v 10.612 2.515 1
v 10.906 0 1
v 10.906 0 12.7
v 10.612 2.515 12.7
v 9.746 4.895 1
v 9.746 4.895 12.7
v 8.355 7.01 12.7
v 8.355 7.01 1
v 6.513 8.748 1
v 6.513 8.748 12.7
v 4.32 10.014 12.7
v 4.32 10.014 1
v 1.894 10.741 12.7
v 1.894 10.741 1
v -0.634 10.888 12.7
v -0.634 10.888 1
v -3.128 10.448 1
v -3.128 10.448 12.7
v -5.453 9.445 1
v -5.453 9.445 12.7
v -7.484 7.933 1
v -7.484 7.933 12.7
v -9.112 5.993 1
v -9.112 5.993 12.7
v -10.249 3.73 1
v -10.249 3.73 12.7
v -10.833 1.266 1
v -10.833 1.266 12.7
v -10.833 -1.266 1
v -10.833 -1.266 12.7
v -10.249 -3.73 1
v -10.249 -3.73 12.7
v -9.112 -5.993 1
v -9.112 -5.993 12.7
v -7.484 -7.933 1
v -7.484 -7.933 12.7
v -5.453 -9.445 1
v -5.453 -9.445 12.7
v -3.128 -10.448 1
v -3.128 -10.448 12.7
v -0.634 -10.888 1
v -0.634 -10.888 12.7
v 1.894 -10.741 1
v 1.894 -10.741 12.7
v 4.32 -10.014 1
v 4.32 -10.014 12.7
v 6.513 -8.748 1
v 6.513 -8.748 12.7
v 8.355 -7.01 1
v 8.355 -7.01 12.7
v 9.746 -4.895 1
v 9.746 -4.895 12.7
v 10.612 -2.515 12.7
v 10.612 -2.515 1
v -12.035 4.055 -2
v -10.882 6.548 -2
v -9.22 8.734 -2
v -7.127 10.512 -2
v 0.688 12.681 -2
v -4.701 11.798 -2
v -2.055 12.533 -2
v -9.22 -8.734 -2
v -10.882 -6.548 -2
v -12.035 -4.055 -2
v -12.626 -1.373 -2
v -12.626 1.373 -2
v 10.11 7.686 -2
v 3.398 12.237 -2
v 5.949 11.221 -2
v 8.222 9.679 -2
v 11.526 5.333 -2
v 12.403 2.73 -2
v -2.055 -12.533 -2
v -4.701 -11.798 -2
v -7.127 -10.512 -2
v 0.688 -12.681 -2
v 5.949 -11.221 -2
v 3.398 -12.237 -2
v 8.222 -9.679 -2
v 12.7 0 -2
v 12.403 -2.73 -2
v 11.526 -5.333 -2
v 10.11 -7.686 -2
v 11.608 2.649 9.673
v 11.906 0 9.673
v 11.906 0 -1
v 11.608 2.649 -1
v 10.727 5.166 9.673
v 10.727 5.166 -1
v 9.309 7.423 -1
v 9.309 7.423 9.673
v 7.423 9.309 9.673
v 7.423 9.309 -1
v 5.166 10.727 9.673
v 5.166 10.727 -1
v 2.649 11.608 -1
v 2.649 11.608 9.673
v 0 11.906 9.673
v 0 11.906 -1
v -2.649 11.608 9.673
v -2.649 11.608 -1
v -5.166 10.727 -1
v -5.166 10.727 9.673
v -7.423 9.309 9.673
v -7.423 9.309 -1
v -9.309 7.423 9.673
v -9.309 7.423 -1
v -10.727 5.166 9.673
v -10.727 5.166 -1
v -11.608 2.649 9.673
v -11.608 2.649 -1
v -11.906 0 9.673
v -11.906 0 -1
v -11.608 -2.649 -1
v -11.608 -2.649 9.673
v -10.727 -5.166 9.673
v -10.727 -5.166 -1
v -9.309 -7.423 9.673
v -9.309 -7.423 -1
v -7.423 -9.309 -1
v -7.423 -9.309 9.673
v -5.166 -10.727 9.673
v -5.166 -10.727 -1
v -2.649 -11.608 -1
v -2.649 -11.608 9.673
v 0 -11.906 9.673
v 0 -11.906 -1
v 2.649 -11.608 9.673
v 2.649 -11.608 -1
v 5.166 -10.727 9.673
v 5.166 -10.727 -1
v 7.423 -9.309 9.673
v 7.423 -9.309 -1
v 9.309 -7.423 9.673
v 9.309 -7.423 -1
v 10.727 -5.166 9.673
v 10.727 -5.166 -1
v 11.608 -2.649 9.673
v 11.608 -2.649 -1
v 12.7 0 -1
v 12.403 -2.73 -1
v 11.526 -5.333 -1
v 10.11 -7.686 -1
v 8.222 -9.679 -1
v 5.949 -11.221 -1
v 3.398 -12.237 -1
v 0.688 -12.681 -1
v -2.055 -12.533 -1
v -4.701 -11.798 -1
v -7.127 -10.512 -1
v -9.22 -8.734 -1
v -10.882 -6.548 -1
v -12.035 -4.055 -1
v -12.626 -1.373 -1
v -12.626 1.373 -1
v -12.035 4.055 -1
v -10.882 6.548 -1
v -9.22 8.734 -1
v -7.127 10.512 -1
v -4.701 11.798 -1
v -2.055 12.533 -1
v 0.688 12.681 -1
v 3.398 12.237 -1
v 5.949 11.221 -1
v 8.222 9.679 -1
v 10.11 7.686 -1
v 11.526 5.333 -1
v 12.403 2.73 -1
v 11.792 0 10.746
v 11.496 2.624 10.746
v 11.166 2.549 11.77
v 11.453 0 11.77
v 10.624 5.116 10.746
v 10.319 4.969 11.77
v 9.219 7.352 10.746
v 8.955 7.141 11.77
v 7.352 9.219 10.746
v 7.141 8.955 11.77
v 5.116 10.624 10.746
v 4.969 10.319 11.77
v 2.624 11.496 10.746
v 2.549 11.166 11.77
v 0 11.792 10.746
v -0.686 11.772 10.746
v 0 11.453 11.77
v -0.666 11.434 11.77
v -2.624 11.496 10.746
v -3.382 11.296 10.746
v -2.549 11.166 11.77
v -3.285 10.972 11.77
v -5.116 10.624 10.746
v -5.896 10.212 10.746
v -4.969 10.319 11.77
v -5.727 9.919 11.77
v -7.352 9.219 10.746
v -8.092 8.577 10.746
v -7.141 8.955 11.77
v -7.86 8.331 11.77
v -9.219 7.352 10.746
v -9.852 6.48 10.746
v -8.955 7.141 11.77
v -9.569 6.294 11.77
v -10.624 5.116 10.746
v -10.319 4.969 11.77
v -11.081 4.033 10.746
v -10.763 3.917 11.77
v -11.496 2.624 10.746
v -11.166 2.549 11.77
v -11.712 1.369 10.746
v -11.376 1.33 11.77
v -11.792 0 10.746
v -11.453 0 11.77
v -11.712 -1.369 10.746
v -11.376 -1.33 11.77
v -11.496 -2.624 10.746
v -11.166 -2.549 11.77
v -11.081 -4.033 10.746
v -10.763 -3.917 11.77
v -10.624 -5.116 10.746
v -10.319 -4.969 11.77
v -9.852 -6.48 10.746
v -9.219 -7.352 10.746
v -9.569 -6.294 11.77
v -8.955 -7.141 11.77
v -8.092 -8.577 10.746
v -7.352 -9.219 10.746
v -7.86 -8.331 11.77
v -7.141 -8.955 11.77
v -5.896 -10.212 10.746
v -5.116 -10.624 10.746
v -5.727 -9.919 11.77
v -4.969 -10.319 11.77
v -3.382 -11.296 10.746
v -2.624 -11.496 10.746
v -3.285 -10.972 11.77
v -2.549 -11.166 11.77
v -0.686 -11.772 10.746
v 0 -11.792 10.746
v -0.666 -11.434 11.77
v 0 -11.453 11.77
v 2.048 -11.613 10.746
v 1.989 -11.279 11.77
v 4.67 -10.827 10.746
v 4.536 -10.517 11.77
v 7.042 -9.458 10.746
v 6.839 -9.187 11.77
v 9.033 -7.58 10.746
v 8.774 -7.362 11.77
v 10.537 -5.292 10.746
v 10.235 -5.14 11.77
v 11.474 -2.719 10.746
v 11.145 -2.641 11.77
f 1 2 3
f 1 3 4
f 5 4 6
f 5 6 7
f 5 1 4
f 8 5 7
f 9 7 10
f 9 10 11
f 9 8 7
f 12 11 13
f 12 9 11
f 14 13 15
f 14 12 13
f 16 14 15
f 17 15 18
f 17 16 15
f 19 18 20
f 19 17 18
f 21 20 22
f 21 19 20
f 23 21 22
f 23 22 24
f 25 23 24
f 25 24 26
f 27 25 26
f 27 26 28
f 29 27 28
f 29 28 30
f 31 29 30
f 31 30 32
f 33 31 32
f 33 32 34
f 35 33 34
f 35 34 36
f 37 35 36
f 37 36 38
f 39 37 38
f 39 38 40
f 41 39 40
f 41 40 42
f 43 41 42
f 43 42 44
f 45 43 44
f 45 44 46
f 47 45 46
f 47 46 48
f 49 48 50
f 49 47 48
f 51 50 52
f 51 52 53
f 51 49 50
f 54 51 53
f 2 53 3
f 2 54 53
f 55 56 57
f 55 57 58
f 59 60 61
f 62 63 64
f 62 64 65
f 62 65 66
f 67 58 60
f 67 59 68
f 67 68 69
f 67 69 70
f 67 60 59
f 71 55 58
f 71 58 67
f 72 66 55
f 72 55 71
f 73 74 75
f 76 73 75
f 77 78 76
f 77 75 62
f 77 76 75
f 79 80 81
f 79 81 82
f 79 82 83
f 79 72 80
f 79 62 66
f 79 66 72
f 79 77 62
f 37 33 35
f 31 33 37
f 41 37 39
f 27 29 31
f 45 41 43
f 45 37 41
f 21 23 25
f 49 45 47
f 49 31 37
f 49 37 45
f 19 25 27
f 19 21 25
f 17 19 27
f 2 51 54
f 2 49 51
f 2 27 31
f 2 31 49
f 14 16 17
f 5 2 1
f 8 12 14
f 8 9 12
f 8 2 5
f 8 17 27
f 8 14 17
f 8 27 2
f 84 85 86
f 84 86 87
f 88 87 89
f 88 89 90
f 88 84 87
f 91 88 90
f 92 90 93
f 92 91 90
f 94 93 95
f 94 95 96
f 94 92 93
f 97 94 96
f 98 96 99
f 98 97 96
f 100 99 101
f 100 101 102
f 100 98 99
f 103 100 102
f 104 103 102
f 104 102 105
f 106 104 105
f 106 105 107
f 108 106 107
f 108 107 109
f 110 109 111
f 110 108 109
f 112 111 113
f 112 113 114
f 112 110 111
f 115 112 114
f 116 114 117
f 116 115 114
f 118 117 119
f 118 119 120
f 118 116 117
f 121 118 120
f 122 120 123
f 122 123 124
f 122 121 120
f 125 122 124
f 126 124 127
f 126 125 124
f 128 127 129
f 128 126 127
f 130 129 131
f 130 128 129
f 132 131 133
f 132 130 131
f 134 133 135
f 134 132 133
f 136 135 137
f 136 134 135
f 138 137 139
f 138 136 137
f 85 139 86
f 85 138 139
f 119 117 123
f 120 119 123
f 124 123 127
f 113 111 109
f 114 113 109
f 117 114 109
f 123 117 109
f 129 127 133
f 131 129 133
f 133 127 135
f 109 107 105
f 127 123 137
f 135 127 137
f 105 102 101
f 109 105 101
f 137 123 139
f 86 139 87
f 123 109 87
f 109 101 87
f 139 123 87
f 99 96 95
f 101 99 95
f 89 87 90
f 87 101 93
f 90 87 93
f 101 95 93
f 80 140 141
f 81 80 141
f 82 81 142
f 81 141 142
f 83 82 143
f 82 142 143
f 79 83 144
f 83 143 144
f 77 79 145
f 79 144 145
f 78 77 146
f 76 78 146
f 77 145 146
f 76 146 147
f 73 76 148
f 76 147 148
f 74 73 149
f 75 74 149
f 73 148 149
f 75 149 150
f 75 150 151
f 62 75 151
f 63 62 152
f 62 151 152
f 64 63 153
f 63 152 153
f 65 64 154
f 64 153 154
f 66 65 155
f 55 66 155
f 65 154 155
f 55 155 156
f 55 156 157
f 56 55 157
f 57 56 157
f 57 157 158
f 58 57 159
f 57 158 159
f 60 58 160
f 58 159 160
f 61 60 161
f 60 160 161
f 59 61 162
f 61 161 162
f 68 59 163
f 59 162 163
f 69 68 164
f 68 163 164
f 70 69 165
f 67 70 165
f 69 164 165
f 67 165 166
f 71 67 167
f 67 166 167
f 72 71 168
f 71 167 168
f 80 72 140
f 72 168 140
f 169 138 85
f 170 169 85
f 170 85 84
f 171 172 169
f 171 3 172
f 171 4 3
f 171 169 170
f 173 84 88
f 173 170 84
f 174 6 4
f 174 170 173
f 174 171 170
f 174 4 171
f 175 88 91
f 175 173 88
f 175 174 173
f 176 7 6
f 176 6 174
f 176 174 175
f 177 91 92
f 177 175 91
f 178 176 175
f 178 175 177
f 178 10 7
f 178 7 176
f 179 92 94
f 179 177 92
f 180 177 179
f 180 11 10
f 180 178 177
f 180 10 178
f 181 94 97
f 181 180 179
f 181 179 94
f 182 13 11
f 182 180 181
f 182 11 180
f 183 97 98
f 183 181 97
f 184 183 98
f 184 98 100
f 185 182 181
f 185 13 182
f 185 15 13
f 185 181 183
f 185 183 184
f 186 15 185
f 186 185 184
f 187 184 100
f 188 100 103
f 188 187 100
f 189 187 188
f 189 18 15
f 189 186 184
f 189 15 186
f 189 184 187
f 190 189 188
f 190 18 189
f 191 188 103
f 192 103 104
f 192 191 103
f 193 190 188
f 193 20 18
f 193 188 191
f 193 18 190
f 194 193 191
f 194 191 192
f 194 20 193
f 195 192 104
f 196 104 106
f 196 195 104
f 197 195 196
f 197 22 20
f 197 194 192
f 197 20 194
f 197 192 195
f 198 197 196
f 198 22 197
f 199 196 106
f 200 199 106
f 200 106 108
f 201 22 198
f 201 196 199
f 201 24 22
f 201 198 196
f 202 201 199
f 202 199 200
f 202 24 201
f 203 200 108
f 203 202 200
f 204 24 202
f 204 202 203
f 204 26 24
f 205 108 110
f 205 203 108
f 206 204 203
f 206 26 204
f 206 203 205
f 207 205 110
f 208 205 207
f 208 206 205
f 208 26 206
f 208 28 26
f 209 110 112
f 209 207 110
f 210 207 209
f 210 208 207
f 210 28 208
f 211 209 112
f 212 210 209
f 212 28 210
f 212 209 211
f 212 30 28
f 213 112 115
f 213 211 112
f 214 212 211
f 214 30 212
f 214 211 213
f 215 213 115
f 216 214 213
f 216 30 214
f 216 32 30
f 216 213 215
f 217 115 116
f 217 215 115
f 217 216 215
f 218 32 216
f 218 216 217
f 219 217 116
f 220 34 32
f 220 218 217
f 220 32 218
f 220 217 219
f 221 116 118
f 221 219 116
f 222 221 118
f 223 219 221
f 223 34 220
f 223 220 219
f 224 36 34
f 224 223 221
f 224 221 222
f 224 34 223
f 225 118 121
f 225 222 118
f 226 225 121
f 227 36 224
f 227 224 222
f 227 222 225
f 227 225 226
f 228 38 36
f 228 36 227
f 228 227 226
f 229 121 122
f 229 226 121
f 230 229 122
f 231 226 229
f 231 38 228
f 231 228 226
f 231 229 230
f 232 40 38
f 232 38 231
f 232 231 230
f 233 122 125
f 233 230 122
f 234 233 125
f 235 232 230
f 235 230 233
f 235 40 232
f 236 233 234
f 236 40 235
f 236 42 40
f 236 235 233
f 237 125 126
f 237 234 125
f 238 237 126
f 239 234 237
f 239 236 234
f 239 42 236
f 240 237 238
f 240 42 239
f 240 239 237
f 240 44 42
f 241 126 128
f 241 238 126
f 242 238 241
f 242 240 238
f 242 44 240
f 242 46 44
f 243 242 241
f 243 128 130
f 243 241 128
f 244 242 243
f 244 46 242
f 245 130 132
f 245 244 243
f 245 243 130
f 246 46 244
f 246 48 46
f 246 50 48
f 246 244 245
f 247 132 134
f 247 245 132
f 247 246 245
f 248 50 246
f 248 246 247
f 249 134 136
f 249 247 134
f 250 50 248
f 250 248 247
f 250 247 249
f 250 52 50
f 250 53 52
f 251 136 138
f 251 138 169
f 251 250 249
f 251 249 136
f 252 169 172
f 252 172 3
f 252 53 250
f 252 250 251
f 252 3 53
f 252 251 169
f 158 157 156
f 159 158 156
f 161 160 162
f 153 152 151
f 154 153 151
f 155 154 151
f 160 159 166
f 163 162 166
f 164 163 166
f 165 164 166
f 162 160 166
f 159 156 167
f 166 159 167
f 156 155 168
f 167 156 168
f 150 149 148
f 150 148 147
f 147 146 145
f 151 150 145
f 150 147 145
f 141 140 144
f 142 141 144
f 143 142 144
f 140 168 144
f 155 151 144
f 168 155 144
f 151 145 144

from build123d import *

# Parameters (mm, degrees)
F0_R     = 11.90625
F1_DEPTH = 12.7
F2_T     = -1
F3_DEPTH = 1
F4_R     = 12.7
F4_R_2   = 11.90625
F5_DEPTH = 1


# Not quite as in the source:
# - a fillet or chamfer that OpenCascade refuses, or shapes differently, is made with other operations: its cross-section is extruded or revolved along the edge and cut away or added


with BuildPart() as f1:
    # F0 (on Top) → F1 (new body)
    with BuildSketch(Plane.XY):
        Circle(F0_R)
    extrude(amount=F1_DEPTH)

    # F2
    f2_openings = [f1.faces().sort_by_distance(p)[0] for p in [
        (0, 0, 12.7),
    ]]
    offset(amount=F2_T, openings=f2_openings)

    # F3 (add): a face of the model
    f3_faces = [f1.faces().sort_by_distance(p)[0] for p in [
        (0, 0, 0),
    ]]
    extrude(f3_faces, amount=F3_DEPTH)

    # F6: fillet of radius 5.08 on 1 edges, made by hand

    # F6_s1 → F6_t2 (revolve, cut)
    with BuildSketch(Plane.XZ):
        with BuildLine():
            ThreePointArc((11.90625, 9.6734508099), (11.6497756815, 11.267188555), (10.90625, 12.7))
            Line((10.90625, 12.7), (11.90625, 12.7))
            Line((11.90625, 12.7), (11.90625, 9.6734508099))
        make_face()
    revolve(axis=Axis((0, 0, 12.7), (0, 0, 1)), mode=Mode.SUBTRACT)


with BuildPart() as f5:
    # F4 (on face) → F5 (new body)
    with BuildSketch(Plane(origin=(0, 0, -1), x_dir=(1, 0, 0), z_dir=(0, 0, -1))):
        Circle(F4_R)
        Circle(F4_R_2, mode=Mode.SUBTRACT)
        Circle(F4_R_2)
    extrude(amount=F5_DEPTH)


solid = Compound([f1.part, f5.part])
